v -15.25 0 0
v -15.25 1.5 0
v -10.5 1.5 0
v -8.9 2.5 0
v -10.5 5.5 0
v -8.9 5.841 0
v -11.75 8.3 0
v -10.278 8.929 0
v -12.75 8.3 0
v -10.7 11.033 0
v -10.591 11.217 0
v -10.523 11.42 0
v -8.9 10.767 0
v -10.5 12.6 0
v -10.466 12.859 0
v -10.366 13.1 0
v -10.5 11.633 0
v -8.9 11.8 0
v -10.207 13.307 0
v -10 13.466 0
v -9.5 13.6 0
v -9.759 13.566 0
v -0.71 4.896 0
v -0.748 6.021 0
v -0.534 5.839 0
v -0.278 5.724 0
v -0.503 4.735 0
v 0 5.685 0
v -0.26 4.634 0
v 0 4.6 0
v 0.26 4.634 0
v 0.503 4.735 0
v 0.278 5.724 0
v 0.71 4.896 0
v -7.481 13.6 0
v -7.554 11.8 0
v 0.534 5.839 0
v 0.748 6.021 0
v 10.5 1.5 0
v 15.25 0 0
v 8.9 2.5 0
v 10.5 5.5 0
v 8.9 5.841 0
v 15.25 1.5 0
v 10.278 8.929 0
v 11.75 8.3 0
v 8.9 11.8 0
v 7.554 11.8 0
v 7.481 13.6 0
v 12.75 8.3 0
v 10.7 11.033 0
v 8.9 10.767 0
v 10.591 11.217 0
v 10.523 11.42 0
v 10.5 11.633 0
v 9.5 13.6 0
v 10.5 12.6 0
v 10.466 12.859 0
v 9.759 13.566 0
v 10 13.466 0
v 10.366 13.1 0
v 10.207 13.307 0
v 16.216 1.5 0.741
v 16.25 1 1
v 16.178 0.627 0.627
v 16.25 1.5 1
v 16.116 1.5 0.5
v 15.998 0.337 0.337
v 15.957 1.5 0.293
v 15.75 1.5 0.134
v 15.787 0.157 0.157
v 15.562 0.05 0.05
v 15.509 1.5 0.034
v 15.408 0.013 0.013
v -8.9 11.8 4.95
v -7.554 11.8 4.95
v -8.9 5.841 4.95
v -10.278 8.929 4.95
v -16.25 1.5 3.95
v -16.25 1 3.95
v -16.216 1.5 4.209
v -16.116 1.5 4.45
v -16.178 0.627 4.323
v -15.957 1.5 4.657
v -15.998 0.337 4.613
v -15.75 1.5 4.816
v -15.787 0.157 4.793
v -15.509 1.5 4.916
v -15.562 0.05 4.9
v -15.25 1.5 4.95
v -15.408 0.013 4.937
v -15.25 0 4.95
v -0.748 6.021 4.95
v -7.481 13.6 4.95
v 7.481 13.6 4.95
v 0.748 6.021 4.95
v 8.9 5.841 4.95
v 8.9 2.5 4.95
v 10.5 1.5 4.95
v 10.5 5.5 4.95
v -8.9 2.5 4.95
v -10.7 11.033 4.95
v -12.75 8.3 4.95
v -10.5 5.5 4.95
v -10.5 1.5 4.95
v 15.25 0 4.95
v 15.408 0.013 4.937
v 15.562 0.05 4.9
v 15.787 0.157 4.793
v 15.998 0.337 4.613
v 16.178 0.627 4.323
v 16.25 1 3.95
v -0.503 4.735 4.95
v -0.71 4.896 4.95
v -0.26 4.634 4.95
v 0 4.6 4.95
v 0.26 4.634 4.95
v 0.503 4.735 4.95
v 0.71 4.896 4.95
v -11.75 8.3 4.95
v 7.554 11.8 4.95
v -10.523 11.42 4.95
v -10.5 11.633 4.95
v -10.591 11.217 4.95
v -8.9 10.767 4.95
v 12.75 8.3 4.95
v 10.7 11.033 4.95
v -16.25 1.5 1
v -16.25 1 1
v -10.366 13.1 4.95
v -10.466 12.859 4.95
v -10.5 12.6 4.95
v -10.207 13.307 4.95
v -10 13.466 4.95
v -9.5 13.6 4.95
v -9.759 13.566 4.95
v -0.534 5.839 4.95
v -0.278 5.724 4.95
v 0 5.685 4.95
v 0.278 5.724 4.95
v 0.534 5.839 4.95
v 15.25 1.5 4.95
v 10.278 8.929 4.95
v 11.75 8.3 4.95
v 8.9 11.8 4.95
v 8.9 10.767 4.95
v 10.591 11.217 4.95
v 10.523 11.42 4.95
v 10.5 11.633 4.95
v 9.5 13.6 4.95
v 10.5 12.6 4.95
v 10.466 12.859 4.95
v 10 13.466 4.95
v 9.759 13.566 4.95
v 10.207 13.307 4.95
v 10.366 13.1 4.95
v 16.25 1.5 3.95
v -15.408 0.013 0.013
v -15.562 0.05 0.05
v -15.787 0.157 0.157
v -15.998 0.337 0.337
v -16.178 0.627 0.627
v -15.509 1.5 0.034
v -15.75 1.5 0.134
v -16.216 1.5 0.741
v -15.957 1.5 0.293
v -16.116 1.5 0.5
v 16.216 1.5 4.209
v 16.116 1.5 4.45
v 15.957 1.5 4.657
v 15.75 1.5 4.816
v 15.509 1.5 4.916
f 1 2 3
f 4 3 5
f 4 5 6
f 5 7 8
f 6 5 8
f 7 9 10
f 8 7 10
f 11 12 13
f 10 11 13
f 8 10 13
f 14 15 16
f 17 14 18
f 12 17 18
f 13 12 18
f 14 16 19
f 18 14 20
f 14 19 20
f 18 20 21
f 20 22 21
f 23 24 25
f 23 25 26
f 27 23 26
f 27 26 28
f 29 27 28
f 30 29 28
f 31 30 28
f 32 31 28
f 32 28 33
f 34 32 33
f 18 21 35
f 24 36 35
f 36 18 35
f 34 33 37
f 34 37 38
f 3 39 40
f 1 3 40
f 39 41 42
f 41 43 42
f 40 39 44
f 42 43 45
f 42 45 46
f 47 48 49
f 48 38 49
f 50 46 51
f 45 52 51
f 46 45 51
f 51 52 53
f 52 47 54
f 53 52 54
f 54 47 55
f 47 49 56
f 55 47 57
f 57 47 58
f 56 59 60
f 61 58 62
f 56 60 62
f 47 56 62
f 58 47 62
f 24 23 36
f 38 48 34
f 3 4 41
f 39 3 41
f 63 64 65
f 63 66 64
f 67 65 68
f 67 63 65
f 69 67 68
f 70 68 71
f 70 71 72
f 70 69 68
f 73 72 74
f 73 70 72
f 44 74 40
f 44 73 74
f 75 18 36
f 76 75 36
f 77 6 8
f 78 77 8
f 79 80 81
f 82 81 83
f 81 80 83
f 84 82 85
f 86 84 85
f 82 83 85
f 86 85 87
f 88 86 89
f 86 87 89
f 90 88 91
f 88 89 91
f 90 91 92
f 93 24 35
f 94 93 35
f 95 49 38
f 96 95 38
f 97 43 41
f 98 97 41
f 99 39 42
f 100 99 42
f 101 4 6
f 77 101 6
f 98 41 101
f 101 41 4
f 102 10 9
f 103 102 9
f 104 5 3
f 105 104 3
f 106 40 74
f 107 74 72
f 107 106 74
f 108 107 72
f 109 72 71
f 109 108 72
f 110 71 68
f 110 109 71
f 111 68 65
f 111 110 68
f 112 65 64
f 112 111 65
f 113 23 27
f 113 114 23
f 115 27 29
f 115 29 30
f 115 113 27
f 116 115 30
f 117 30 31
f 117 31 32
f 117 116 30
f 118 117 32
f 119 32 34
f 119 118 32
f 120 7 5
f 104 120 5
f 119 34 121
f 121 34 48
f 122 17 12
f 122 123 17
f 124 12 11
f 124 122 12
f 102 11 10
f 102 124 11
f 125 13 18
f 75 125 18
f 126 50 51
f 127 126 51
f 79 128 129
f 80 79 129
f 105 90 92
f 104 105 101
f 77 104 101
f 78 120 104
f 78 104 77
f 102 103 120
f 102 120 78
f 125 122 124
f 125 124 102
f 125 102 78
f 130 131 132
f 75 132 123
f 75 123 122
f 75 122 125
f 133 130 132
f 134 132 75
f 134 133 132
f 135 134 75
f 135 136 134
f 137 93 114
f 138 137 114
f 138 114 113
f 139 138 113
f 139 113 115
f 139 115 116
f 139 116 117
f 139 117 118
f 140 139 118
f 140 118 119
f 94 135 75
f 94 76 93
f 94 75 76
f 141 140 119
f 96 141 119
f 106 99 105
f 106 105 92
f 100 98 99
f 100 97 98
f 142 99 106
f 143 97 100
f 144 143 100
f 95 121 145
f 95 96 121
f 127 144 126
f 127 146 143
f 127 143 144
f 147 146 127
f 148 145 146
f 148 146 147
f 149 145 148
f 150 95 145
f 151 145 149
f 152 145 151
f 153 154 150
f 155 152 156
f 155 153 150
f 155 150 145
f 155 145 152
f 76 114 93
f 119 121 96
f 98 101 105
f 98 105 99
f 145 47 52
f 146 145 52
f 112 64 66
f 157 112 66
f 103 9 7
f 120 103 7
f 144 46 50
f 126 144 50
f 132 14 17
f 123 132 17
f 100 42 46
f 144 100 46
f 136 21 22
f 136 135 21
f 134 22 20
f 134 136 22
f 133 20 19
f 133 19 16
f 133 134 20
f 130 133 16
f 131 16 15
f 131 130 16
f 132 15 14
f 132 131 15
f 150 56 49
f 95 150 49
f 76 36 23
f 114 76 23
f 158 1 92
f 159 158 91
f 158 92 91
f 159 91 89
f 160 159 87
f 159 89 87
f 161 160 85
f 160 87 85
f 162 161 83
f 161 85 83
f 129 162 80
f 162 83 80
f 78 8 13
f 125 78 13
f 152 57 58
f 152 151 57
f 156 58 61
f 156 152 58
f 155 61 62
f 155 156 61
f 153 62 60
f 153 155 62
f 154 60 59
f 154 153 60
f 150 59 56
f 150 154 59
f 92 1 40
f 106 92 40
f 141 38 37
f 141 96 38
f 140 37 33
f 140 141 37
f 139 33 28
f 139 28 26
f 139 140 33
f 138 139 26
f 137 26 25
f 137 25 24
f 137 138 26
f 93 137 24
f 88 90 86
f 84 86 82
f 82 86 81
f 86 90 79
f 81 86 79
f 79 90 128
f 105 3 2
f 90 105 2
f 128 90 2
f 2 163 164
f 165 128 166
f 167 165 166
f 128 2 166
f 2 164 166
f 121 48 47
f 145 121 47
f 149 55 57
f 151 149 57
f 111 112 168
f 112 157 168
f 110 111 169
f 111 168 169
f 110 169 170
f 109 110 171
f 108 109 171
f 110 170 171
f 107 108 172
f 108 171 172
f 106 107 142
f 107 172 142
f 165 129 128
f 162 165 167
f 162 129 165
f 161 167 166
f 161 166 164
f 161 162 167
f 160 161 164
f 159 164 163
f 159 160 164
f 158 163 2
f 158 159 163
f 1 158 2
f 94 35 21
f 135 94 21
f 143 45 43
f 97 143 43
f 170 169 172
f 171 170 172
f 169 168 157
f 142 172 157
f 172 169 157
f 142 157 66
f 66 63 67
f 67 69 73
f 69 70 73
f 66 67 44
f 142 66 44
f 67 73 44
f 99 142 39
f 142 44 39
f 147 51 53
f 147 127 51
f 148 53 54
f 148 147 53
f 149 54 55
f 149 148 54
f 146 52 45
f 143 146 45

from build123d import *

# Parameters (mm, degrees)
F1_DEPTH = 4.95
F2_R     = 1


with BuildPart() as f1:
    # F0 (on Top) → F1 (new body)
    with BuildSketch(Plane.XY):
        Polygon((-16.25, 0), (0, 0), (16.25, 0), (16.25, 1.5), (10.5, 1.5), (10.5, 5.5), (11.75, 8.3), (12.75, 8.3), (10.5, 11.3), (10.5, 13.6000004441), (7.4805053882, 13.6000004441), (0, 5.1791056932), (-7.4805053882, 13.6000004441), (-10.5, 13.6000004441), (-10.5, 11.3), (-12.75, 8.3), (-11.75, 8.3), (-10.5, 5.5), (-10.5, 1.5), (-16.25, 1.5), align=None)
        Polygon((-10.2784717774, 8.9287042967), (-8.9, 10.7666666667), (-8.9, 11.8000004441), (-7.5543964098, 11.8000004441), (0, 4.1791056932), (7.5543964098, 11.8000004441), (8.9, 11.8000004441), (8.9, 10.7666666667), (10.2784717774, 8.9287042967), (8.9, 5.8409275153), (8.9, 2.5), (0, 2.5), (-8.9, 2.5), (-8.9, 5.8409275153), align=None, mode=Mode.SUBTRACT)
    extrude(amount=F1_DEPTH)

    # F2
    f2_edges = [f1.edges().sort_by_distance(p)[0] for p in [
        (-16.25, 0.75, 4.95),
        (-16.25, 0.75, 0),
        (16.25, 0.75, 4.95),
        (16.25, 0.75, 0),
        (-16.25, 0, 2.475),
        (16.25, 0, 2.475),
        (0, 5.179106, 2.475),
        (0, 4.179106, 2.475),
        (-10.5, 11.3, 2.475),
        (-10.5, 13.6, 2.475),
        (10.5, 13.6, 2.475),
        (10.5, 11.3, 2.475),
    ]]
    fillet(f2_edges, radius=F2_R)


solid = f1.part
